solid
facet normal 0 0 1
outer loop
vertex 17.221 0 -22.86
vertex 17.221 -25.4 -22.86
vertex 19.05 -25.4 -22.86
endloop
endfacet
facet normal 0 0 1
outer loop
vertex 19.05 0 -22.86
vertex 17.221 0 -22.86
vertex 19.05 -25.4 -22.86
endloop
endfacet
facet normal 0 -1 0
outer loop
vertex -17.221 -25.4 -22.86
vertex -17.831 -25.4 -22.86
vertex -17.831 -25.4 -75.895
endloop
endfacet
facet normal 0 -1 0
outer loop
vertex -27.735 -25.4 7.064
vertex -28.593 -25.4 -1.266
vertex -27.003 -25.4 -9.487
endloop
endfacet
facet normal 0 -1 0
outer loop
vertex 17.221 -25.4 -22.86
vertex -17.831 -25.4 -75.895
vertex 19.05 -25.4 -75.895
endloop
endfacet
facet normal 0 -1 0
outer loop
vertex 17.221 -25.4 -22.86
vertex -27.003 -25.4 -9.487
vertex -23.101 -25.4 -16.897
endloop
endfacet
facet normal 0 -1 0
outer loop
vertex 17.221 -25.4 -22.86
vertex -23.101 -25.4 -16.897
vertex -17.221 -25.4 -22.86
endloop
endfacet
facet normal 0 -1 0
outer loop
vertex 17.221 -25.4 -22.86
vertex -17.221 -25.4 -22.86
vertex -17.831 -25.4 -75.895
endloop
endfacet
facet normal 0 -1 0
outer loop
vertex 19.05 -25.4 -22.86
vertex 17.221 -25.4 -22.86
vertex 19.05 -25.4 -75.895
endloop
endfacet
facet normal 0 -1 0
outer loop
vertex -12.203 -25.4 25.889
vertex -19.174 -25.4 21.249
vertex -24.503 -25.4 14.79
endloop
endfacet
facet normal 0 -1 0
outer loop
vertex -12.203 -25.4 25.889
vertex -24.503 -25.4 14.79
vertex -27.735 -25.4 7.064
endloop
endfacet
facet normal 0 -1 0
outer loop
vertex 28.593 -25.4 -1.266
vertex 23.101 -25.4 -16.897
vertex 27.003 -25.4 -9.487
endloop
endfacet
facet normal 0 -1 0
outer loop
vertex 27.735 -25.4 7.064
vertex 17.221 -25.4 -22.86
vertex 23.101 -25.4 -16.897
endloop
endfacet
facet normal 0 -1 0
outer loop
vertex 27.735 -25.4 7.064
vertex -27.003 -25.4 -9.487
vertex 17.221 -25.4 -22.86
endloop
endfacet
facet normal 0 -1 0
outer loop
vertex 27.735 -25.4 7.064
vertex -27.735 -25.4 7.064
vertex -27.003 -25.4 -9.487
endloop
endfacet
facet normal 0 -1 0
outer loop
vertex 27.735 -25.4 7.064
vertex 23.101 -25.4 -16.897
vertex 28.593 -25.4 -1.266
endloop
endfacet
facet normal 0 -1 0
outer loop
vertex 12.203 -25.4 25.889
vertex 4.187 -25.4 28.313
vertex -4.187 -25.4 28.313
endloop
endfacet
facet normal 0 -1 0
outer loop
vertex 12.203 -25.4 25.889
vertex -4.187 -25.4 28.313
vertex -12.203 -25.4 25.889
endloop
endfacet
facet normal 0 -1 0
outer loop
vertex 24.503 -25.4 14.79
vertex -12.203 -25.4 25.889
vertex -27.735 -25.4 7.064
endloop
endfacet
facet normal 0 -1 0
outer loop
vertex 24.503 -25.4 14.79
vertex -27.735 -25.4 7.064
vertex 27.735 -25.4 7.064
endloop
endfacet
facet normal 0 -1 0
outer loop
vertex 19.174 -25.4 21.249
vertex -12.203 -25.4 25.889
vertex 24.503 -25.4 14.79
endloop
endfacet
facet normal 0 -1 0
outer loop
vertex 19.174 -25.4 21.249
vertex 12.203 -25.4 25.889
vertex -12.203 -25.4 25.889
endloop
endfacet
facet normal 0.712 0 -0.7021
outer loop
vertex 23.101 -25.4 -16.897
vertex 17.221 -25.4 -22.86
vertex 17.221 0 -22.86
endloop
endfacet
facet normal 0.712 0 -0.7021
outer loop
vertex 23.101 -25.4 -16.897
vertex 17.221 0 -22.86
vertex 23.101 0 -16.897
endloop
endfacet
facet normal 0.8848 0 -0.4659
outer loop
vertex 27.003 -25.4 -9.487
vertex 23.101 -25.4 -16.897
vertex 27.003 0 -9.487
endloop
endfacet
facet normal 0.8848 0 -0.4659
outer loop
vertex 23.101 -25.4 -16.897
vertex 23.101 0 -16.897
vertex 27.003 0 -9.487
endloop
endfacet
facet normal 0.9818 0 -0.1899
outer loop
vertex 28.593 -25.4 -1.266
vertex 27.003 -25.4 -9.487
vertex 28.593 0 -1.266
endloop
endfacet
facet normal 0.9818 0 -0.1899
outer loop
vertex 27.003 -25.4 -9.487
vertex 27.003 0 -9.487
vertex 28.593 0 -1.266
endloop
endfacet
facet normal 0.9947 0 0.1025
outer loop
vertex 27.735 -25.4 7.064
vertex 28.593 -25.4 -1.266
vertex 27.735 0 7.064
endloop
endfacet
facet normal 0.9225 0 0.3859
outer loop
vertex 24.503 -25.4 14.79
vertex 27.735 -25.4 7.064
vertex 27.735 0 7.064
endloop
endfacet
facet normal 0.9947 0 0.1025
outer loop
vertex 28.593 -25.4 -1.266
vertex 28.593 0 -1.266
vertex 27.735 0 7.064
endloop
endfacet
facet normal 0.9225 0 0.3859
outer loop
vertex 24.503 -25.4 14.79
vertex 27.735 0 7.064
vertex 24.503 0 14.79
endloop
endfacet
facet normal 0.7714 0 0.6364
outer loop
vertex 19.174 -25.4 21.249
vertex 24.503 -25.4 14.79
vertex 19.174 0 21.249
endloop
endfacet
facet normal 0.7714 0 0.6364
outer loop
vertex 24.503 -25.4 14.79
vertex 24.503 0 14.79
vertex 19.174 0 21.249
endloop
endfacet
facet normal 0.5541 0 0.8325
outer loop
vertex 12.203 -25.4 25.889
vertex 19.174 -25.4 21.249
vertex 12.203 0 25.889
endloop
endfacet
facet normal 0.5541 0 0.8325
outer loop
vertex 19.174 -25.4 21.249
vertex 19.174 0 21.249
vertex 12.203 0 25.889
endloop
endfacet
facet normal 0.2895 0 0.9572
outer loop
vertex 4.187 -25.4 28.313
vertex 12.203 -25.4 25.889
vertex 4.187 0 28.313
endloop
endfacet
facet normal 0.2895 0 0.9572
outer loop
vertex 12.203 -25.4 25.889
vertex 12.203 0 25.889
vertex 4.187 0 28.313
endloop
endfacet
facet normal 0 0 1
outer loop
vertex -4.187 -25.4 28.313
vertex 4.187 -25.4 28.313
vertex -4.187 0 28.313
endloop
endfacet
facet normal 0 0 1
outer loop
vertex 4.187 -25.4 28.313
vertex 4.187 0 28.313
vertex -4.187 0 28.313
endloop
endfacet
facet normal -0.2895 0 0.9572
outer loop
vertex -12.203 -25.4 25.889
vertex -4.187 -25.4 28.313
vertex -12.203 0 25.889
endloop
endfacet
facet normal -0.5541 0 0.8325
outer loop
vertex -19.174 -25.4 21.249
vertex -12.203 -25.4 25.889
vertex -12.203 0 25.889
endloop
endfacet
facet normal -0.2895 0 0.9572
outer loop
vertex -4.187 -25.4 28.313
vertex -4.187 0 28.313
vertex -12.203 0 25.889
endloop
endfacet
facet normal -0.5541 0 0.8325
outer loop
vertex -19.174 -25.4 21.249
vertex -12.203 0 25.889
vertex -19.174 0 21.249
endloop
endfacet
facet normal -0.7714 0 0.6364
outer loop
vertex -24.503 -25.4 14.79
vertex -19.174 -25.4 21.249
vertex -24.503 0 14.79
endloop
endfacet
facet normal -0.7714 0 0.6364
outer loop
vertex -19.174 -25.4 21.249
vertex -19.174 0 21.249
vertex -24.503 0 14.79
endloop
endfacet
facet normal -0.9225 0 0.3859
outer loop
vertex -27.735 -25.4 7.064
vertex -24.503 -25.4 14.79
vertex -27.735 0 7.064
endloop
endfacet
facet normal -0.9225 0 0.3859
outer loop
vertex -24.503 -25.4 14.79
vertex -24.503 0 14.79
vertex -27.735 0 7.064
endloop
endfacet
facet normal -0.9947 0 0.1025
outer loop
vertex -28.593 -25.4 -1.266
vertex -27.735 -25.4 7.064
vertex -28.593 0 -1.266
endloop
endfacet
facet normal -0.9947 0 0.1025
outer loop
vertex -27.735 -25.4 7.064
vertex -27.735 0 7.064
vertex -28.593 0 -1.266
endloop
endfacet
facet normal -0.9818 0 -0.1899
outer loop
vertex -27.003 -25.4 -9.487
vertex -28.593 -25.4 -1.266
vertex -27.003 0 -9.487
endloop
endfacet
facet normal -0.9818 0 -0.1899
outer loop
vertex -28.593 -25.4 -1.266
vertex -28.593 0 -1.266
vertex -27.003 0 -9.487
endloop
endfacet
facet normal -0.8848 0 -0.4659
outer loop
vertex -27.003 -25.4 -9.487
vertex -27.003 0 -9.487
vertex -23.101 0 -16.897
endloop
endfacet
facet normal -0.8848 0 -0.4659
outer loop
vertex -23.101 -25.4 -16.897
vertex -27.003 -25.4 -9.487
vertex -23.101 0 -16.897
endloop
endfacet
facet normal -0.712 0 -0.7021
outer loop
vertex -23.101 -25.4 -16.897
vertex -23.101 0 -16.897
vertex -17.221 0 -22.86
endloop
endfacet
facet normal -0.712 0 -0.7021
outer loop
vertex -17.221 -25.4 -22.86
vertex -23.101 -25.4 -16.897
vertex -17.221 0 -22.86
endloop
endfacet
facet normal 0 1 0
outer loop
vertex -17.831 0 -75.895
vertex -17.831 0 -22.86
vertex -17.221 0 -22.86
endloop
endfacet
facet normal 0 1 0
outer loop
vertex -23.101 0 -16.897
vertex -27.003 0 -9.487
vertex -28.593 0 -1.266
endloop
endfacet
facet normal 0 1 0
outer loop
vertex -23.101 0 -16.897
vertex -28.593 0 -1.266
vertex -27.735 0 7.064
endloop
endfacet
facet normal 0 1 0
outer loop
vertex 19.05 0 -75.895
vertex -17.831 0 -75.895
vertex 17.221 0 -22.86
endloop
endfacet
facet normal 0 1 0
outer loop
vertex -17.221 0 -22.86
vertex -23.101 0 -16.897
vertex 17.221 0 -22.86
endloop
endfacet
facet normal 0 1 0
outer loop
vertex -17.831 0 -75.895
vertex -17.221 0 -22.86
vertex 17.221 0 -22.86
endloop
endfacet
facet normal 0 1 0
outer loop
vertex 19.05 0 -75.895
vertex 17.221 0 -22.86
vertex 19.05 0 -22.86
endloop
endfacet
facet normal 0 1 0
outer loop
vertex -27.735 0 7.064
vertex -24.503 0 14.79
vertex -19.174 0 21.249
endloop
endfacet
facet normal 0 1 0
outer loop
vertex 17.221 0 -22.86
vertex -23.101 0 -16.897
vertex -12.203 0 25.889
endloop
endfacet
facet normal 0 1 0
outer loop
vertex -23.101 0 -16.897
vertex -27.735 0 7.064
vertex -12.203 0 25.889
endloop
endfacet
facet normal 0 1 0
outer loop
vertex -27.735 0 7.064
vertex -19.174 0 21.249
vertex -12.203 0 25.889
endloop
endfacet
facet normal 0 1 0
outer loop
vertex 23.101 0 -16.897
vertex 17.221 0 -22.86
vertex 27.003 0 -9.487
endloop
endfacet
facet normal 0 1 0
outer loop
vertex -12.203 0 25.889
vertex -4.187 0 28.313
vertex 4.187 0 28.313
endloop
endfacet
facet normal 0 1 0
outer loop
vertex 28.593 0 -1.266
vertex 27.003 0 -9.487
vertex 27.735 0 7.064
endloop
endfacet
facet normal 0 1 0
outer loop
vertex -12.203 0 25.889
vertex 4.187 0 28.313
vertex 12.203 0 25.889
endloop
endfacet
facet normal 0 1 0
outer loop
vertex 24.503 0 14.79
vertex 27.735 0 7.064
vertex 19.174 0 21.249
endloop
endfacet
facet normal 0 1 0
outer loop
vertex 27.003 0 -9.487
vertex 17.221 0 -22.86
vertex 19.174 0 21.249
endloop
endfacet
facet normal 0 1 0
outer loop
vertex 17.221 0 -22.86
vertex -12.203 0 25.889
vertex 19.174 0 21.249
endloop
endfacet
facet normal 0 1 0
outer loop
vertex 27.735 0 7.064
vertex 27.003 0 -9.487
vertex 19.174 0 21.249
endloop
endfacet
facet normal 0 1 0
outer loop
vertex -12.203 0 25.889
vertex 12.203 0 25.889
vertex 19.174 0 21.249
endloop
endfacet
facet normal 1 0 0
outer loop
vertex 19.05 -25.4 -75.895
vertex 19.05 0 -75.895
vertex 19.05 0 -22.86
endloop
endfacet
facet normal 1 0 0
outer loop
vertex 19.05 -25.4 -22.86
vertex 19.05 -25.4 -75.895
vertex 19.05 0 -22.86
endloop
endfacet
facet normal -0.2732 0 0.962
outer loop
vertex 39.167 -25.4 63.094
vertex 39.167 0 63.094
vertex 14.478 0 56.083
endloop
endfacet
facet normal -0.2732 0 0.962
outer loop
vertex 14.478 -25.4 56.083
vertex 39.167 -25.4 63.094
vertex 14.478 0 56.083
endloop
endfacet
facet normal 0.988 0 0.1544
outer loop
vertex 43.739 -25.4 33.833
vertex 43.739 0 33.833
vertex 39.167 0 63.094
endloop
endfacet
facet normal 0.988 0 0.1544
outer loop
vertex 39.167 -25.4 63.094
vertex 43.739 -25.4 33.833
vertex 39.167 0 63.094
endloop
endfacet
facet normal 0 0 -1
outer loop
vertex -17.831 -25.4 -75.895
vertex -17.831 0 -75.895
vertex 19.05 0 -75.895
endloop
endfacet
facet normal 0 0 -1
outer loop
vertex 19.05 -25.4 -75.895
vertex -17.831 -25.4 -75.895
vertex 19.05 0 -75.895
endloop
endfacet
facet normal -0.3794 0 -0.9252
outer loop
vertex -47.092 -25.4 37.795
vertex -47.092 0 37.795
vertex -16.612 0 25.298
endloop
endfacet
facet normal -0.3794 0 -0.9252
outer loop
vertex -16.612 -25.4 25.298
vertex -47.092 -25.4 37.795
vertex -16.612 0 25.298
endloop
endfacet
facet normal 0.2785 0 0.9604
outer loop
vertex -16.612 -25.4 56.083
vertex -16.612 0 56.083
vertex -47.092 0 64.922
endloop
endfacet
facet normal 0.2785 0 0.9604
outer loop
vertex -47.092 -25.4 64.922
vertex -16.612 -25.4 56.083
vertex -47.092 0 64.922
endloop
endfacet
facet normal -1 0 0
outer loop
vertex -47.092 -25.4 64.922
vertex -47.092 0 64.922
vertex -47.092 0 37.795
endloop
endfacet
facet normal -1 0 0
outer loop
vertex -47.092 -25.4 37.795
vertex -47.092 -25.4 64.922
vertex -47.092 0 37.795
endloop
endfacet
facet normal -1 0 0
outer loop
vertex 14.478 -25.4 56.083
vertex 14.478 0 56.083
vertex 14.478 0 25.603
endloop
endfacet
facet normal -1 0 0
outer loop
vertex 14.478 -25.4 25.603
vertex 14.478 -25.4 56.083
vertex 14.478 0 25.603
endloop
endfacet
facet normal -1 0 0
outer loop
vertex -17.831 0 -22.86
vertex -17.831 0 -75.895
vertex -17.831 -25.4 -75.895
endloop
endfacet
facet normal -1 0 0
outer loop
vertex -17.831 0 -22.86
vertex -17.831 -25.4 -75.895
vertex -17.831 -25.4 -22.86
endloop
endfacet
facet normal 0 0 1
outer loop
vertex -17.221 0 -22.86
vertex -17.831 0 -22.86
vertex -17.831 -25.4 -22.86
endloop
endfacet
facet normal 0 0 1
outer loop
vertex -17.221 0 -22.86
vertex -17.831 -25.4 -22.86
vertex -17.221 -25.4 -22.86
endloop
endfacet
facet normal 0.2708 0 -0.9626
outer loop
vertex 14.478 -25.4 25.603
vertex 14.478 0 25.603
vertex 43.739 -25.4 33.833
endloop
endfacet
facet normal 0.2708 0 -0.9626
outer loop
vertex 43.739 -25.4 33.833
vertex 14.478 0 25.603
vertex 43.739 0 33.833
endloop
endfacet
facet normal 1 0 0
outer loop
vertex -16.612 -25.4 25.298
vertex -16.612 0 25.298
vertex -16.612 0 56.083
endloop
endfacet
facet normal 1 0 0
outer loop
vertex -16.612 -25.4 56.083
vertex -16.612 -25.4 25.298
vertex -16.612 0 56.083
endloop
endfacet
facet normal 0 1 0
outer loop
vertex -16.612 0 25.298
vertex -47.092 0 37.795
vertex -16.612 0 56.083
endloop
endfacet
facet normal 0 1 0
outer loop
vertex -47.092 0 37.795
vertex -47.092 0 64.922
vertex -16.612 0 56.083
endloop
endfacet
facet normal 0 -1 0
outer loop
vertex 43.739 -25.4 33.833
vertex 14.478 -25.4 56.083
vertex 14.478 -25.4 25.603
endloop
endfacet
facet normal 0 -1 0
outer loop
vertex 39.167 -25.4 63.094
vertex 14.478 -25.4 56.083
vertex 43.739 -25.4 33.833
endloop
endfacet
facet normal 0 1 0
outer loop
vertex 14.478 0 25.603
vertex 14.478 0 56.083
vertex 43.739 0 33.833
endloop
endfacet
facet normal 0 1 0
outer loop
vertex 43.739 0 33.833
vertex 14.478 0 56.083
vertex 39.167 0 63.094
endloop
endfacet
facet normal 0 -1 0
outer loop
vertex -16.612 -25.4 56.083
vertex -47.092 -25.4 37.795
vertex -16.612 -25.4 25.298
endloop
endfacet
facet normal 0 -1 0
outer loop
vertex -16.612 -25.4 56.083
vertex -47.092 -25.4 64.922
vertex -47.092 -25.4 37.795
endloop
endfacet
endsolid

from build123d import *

# Parameters (mm, degrees)
F0_R     = 28.620787
F1_DEPTH = 25.4
F3_DEPTH = 25.4
F5_DEPTH = 25.4
F6_W     = 36.8808
F6_H     = 53.035203
F7_DEPTH = 25.4


with BuildPart() as f1:
    # F0 (on Front) → F1 (new body)
    with BuildSketch(Plane.XZ):
        Circle(F0_R)
    extrude(amount=F1_DEPTH)

    # F6 (on Front) → F7 (join)
    with BuildSketch(Plane.XZ):
        with Locations((0.6096, -49.377603)):
            Rectangle(F6_W, F6_H)
    extrude(amount=F7_DEPTH)


with BuildPart() as f3:
    # F2 (on Front) → F3 (new body)
    with BuildSketch(Plane.XZ):
        Polygon((-47.0916, 37.795201), (-16.6116, 25.2984), (-16.6116, 56.083202), (-47.0916, 64.9224), align=None)
    extrude(amount=F3_DEPTH)


with BuildPart() as f5:
    # F4 (on Front) → F5 (new body)
    with BuildSketch(Plane.XZ):
        Polygon((14.477999, 56.083202), (14.477999, 25.603199), (43.738801, 33.8328), (39.166801, 63.093603), align=None)
    extrude(amount=F5_DEPTH)


solid = Compound([f1.part, f3.part, f5.part])
